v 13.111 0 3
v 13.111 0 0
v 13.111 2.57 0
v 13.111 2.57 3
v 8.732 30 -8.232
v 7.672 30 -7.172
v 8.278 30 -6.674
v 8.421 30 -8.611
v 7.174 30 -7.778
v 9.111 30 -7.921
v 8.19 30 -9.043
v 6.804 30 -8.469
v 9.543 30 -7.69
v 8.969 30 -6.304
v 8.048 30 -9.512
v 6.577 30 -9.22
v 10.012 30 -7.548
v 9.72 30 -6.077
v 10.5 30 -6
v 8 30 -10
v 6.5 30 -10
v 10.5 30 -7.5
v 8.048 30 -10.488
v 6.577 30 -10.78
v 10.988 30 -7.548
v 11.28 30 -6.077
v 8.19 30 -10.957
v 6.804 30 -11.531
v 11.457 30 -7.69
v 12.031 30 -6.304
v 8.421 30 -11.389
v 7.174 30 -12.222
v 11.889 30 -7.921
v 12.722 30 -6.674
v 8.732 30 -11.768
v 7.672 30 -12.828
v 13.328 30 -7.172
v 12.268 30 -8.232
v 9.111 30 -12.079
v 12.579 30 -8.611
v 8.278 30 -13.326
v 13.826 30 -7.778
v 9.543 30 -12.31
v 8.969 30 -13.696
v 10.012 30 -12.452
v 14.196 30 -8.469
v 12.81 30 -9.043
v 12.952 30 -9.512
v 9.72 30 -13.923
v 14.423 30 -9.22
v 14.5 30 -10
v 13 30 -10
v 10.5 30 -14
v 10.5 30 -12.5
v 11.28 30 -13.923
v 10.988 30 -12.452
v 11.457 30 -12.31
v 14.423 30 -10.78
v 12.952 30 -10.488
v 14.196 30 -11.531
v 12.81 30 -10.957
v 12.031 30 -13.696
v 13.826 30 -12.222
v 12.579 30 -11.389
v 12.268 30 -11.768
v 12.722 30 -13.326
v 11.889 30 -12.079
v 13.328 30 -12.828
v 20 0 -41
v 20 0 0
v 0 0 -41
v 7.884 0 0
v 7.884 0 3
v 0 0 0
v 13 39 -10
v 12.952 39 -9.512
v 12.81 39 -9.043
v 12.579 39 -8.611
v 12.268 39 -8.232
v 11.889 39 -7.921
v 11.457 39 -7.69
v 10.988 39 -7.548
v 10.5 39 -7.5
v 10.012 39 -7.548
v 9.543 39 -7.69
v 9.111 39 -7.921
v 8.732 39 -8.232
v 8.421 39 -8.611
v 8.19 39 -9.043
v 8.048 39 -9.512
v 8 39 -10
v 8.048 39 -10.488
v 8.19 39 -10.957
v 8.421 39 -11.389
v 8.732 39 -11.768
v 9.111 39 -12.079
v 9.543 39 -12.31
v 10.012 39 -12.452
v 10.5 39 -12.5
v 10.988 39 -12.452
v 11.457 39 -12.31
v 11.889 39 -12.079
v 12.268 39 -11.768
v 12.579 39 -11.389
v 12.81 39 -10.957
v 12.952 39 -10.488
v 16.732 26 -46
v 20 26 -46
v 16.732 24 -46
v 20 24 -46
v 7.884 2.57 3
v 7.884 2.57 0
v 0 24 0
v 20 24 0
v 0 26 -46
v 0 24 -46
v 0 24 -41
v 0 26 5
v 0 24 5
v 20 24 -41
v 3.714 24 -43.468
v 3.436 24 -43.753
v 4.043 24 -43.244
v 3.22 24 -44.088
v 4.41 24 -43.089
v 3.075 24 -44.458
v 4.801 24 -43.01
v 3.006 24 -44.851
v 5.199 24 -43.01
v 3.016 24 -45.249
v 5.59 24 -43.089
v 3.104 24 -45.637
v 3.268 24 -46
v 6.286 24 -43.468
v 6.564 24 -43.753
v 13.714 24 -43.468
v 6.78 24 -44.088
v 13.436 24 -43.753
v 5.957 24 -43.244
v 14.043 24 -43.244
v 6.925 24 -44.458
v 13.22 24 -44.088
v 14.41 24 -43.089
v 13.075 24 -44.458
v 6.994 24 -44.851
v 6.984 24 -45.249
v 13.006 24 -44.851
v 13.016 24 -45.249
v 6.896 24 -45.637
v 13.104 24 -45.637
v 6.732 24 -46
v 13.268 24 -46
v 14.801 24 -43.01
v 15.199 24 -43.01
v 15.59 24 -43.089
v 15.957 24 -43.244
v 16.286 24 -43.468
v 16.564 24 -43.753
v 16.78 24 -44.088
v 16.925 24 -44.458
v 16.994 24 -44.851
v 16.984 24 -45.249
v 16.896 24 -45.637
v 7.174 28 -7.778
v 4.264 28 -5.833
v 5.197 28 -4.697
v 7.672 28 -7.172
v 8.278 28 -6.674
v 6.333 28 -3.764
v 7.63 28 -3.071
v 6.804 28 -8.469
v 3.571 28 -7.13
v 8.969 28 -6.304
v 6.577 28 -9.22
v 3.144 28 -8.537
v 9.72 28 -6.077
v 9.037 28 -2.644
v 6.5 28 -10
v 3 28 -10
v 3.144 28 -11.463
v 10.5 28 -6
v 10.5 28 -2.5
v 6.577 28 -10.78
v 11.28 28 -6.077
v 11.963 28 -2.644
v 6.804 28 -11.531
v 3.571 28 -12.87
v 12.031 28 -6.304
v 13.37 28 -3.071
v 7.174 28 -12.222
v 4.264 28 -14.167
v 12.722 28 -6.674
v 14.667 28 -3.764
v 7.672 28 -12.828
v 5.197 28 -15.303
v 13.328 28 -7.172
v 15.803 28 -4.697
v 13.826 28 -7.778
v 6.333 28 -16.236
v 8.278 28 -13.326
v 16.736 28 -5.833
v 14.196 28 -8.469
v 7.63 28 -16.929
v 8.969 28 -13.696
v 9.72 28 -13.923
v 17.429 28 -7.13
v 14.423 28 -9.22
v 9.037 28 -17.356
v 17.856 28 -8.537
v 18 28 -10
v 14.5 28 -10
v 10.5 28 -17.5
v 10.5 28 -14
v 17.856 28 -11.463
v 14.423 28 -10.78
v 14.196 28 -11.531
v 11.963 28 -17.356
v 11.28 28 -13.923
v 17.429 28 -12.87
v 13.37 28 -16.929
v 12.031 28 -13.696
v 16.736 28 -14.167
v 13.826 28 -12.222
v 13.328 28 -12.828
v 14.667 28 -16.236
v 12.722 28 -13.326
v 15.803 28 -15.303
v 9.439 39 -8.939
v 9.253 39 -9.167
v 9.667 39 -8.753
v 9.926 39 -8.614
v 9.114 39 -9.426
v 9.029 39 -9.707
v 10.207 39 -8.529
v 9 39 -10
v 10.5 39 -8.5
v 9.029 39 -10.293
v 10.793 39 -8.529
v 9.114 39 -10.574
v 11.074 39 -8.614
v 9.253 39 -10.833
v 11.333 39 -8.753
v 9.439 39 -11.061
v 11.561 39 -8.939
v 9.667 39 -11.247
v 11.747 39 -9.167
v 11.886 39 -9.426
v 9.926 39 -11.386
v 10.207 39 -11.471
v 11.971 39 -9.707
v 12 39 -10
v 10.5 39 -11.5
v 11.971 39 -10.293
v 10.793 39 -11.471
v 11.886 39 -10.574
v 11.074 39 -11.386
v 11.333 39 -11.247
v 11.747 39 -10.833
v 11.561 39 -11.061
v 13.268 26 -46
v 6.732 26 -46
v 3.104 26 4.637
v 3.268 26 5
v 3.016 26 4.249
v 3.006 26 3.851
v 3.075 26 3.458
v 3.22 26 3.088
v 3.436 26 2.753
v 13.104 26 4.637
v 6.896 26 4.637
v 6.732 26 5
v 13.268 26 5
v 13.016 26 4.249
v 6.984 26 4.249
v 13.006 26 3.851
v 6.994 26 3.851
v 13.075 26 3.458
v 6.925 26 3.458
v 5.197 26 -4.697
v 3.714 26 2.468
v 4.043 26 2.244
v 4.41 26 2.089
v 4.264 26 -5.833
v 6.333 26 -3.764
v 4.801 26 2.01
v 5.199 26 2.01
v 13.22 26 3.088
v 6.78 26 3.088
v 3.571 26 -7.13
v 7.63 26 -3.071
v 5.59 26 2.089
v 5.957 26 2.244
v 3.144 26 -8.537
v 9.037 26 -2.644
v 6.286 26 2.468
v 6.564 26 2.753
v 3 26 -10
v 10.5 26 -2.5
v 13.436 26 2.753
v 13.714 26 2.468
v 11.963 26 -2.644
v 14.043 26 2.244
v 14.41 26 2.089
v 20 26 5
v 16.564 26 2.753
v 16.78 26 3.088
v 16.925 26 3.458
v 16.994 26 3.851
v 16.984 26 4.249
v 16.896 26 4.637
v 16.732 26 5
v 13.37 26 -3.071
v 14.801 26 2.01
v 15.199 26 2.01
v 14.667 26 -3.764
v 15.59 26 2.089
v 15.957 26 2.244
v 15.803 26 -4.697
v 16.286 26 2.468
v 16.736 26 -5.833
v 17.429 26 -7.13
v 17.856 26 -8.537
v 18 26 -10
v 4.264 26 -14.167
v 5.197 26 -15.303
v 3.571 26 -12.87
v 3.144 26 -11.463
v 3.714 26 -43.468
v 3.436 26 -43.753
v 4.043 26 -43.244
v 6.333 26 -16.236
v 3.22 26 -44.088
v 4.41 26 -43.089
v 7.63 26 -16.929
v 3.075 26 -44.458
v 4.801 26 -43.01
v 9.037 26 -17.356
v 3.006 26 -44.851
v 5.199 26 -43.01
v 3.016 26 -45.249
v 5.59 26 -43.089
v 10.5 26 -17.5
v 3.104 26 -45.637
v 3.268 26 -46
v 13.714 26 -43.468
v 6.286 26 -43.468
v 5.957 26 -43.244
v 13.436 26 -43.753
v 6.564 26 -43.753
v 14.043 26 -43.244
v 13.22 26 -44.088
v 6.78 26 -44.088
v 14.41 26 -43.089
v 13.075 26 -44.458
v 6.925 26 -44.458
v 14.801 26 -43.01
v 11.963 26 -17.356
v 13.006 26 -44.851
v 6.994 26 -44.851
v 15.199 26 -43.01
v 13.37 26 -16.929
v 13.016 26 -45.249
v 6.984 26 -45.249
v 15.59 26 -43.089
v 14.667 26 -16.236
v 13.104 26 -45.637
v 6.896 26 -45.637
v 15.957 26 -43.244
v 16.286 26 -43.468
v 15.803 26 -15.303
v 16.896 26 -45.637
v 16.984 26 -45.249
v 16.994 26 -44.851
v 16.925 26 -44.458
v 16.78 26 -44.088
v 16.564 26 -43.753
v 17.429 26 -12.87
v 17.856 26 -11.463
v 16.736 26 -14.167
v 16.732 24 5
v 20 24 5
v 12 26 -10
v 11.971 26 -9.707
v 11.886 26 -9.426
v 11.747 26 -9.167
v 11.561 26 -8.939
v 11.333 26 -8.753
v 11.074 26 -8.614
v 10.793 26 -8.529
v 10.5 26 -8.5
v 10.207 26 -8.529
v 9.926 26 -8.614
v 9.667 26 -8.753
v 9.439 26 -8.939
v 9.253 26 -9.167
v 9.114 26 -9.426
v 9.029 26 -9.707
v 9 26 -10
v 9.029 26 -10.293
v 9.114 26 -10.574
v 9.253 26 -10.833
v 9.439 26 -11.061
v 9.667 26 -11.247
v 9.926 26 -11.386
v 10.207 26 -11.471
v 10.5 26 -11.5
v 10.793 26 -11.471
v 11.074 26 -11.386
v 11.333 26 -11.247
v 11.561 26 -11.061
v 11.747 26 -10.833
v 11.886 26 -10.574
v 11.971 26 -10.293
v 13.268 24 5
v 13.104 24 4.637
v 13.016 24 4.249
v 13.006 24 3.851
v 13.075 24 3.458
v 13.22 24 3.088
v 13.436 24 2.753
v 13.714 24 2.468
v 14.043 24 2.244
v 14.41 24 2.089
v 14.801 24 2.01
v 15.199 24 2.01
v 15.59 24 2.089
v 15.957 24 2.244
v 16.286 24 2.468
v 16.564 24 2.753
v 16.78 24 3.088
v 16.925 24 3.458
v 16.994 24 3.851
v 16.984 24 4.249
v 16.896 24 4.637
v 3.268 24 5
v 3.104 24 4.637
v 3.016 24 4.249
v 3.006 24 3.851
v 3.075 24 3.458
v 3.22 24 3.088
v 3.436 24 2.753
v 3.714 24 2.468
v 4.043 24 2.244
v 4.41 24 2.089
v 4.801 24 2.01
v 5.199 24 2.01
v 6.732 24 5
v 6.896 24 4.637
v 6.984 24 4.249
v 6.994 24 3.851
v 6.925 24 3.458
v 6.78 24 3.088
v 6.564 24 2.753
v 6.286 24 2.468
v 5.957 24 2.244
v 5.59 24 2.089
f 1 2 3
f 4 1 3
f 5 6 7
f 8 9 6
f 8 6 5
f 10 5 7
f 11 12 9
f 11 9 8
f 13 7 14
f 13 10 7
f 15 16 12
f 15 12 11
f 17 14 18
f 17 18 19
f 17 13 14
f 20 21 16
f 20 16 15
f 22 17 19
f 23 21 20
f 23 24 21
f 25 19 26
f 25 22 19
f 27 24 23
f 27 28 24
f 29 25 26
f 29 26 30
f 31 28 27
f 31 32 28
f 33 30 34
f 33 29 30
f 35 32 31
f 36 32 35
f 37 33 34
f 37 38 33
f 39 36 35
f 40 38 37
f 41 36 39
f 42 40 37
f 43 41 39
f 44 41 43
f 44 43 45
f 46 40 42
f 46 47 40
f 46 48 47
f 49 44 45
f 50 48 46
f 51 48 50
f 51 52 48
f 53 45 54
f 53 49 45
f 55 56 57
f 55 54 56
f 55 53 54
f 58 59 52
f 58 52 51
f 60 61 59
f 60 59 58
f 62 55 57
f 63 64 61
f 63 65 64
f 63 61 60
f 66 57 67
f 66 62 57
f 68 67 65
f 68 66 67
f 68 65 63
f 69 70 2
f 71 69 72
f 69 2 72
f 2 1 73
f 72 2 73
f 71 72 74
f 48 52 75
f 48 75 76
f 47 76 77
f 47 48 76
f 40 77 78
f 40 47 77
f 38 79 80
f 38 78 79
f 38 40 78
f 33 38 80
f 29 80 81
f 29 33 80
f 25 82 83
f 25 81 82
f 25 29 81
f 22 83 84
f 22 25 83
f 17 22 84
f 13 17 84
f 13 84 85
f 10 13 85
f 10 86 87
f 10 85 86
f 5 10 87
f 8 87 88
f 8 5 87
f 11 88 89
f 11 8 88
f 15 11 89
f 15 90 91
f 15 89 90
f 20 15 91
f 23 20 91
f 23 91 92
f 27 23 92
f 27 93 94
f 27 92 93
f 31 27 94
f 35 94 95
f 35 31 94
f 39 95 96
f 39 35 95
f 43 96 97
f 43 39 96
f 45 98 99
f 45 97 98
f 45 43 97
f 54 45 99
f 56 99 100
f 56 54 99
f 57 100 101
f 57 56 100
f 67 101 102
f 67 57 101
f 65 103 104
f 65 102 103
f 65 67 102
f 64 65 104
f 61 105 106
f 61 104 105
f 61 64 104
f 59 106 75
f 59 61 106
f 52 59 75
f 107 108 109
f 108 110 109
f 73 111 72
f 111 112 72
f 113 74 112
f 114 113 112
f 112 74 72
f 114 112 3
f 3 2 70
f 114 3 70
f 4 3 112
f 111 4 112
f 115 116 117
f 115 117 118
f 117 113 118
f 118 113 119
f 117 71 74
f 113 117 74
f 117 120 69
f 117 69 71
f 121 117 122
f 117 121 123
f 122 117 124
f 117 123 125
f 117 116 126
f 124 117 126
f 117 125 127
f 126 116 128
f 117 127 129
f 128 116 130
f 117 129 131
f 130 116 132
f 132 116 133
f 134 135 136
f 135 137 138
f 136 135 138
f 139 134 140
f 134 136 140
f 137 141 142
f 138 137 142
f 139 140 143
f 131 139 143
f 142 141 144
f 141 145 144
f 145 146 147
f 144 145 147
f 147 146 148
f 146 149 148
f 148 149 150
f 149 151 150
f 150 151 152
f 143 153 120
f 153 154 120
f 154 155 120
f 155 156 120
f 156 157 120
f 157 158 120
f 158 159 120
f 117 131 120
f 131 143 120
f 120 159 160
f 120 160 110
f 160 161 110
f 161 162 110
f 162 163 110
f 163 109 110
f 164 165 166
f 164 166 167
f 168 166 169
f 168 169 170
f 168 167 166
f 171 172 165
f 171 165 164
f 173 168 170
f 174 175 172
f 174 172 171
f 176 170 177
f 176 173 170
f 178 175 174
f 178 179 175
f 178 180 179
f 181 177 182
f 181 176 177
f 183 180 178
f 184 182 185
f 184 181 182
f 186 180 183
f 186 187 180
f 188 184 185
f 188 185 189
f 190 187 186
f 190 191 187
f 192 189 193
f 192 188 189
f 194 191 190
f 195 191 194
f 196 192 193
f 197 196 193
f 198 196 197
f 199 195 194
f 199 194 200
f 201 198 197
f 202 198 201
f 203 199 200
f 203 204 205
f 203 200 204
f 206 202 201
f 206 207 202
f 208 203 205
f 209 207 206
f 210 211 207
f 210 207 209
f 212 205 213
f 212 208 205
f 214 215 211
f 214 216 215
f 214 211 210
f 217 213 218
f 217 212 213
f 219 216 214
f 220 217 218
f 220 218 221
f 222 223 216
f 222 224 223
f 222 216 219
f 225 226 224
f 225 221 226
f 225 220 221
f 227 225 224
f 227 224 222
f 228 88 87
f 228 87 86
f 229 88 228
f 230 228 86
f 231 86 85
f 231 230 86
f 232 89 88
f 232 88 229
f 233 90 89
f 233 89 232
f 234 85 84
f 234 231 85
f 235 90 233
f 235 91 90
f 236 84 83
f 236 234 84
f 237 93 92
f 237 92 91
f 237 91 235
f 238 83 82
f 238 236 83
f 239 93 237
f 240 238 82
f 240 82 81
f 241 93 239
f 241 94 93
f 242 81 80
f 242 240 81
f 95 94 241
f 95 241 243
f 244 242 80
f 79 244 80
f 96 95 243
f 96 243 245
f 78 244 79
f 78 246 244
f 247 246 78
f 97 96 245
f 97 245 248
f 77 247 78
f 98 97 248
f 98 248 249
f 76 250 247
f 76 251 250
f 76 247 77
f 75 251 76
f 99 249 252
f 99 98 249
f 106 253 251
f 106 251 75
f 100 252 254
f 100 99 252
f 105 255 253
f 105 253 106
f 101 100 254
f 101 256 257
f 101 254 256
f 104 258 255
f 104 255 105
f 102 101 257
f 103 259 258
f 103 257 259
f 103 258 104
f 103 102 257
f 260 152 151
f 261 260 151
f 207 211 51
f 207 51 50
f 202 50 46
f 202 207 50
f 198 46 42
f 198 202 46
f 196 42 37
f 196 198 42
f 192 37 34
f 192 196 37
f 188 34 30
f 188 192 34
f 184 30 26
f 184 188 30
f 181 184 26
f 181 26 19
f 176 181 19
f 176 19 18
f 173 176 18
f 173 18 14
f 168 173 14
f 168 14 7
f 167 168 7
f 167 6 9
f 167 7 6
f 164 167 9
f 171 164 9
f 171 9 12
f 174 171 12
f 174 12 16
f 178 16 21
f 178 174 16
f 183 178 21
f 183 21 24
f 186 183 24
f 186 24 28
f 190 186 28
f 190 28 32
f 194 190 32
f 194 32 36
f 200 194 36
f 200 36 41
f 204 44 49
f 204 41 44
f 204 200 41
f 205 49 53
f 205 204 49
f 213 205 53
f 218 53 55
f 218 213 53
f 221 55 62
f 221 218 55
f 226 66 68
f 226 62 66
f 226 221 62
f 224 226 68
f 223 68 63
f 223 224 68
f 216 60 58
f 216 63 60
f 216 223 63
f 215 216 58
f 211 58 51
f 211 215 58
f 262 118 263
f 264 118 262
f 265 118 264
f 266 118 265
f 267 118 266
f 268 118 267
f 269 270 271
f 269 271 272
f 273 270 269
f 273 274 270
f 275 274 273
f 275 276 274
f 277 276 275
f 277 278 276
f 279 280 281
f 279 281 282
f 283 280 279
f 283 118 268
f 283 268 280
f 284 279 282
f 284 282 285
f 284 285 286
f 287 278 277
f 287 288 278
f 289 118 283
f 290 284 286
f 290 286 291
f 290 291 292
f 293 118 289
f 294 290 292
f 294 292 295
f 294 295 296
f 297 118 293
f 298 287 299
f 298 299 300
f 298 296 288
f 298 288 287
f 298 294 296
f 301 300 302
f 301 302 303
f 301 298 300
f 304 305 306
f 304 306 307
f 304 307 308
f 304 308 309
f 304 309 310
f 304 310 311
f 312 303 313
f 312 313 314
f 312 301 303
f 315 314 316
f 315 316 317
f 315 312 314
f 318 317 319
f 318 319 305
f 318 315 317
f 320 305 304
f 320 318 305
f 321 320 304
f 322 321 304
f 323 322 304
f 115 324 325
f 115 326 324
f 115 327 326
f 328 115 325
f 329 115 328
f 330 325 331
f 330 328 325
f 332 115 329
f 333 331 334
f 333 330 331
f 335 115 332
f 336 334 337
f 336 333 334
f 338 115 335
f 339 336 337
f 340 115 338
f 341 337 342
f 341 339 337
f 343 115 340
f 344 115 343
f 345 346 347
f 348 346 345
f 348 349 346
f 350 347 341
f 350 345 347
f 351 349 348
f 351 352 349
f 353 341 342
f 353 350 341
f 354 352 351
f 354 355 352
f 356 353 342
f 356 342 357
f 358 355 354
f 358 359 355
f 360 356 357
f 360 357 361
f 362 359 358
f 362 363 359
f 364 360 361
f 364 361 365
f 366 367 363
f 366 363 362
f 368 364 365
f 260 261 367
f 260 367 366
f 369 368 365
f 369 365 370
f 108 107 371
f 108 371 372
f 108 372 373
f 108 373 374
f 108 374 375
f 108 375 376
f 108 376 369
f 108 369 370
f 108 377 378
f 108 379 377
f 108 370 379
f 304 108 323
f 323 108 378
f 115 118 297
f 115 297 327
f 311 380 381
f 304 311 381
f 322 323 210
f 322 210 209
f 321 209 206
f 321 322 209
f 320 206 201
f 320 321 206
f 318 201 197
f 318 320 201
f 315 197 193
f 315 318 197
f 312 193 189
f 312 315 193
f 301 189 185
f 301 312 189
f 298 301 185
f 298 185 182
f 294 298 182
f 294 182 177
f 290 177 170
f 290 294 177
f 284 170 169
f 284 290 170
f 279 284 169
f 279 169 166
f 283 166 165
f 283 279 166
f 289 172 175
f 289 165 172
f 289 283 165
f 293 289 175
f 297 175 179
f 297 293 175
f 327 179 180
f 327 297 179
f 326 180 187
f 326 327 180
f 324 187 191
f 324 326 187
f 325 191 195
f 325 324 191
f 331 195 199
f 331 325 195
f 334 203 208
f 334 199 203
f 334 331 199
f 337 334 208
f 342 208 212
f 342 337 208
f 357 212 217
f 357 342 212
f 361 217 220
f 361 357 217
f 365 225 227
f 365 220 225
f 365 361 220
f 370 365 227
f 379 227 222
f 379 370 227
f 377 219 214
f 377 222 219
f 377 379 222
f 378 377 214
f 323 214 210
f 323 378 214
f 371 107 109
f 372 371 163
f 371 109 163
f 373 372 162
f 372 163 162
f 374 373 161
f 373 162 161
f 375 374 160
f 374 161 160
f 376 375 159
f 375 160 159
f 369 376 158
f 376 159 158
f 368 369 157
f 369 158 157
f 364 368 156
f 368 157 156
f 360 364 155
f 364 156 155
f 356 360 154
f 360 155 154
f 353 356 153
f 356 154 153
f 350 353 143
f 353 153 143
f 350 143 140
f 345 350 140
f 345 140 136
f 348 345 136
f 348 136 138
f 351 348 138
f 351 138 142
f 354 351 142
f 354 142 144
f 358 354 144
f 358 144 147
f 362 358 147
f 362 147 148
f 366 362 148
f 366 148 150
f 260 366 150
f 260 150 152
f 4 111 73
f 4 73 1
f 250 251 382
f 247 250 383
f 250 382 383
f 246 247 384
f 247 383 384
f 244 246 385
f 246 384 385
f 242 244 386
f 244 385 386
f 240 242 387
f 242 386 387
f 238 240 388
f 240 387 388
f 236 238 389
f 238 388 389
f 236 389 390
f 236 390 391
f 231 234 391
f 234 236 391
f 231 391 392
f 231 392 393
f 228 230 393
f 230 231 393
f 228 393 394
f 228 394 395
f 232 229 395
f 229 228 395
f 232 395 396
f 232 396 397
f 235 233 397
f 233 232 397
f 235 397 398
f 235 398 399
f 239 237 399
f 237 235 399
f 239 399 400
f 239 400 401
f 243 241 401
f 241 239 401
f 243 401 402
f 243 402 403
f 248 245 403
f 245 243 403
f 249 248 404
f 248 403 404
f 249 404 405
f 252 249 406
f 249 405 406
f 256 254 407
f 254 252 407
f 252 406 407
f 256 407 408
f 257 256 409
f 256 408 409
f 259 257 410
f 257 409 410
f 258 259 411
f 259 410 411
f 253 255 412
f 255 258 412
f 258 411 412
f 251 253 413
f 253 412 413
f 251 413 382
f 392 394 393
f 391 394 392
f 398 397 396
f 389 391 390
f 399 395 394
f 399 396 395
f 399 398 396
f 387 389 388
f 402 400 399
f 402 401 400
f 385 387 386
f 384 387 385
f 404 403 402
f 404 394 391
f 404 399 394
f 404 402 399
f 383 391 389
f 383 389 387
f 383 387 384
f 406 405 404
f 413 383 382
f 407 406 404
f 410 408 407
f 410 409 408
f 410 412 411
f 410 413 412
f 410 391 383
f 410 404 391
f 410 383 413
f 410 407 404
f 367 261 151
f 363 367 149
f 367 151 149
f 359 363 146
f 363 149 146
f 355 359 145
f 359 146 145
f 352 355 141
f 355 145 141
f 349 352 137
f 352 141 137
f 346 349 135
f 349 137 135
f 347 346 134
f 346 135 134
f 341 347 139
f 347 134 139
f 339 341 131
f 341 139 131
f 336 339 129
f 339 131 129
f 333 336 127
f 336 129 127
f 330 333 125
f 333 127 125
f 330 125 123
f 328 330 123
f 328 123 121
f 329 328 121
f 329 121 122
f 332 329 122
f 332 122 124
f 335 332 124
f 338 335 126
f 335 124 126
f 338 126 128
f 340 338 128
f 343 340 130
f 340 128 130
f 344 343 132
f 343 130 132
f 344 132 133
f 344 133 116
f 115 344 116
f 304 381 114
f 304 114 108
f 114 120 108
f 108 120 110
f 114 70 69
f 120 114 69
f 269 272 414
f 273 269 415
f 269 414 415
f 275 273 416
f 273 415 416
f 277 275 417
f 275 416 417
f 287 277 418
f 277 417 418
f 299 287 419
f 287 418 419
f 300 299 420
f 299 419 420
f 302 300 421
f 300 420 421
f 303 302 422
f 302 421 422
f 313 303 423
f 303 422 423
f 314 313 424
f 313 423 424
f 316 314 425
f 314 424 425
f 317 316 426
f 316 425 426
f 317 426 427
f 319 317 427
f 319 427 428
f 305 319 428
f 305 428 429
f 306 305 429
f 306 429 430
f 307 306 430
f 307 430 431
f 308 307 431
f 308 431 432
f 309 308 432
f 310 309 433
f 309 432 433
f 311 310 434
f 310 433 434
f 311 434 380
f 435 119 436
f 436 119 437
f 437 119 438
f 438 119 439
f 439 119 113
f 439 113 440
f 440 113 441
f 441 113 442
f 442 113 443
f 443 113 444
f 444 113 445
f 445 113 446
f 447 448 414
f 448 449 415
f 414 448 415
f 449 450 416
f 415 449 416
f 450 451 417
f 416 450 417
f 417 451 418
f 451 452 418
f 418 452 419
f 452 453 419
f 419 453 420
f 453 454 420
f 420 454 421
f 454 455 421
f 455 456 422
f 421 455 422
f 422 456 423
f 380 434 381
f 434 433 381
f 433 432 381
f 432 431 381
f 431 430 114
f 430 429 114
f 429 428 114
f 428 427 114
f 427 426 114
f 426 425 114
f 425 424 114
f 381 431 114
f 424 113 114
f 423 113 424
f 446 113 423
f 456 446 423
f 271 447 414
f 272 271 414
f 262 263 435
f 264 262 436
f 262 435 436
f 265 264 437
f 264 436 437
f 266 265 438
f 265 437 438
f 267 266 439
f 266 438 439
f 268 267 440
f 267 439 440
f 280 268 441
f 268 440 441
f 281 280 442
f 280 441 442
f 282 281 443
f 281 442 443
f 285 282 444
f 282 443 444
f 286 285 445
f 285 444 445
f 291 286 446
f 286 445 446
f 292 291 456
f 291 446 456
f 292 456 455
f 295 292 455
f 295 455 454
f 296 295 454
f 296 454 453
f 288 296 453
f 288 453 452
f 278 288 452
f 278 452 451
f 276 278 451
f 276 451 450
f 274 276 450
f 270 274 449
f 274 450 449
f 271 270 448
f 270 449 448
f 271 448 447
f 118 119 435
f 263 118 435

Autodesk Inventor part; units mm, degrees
ref_plane "YZ Plane" through (0, 0, 0) normal (1, 0, 0) x (0, 1, 0)
ref_plane "XZ Plane" through (0, 0, 0) normal (0, 1, 0) x (-1, 0, 0)
sketch "Sketch1" plane through (0, 0, 0) normal (0, 1, 0) x (-1, 0, 0)
  line L0 (0, 0) -> (-20, 0)
  line L1 (-20, 0) -> (-20, -41)
  line L2 (-20, -41) -> (0, -41)
  line L3 (0, -41) -> (0, 0)
  dimension "d0" = 20
  dimension "d1" = 41
extrude "Extrusion1" add sketch "Sketch1" along normal blind 24
sketch "Sketch2" plane through (0, 24, 0) normal (0, 1, 0) x (1, 0, 0)
  line L0 (0, 41) -> (0, 0) projected
  line L1 (0, 0) -> (0, -5)
  line L2 (0, -5) -> (20, -5)
  line L3 (20, -5) -> (20, 46)
  line L4 (20, 46) -> (0, 46)
  line L5 (0, 46) -> (0, -5)
  line L6 (0, -4) -> (5, -4)
  circle A0 centre (5, -4) radius 2
  line L7 (5, -4) -> (15, -4)
  circle A1 centre (15, -4) radius 2
  line L8 (0, 0) -> (0, 20.5)
  line L9 (0, 20.5) -> (20, 20.5)
  line L10 (20, 0) -> (20, 41) projected
  line L11 (0, 45) -> (5, 45)
  circle A2 centre (5, 45) radius 2
  circle A3 centre (15, 45) radius 2
  line L12 (0, 0) -> (20, 0) projected
  point P0 (3.2679, -5)
  point P1 (6.7321, -5)
  point P2 (13.2679, -5)
  point P3 (16.7321, -5)
  point P4 (16.7321, 46)
  point P5 (13.2679, 46)
  point P6 (6.7321, 46)
  point P7 (3.2679, 46)
  dimension "d4" = 5
  dimension "d5" = 20
  dimension "d6" = 51
  dimension "d7" = 5
  dimension "d8" = 4
  dimension "d9" = 10
  dimension "d10" = 4
  dimension "d11" = 20.5
  dimension "d29" = 4
extrude "Extrusion2" add sketch "Sketch2" along normal blind 2 contours L5 L11 A2 L4 A3 L3 L9 L0 | L9 L3 L12 L0 | L5 L4 A2 L11 | L12 L3 L2 A1 L7 A0 L6 L1 | L6 A0 L2 L1 | L7 A1 L2 A0
sketch "Sketch3" plane through (0, 26, 0) normal (0, 1, 0) x (1, 0, 0)
  line L0 (0, 46) -> (0, -5) projected
  line L1 (0, -5) -> (0, 10)
  line L2 (0, 10) -> (10.5, 10)
  circle A0 centre (10.5, 10) radius 2.5
  circle A1 centre (10.5, 10) radius 4
  circle A2 centre (10.5, 10) radius 7.5
  circle A3 centre (10.5, 10) radius 1.5
  point P0 (0, 0)
  dimension "d14" = 15
  dimension "d15" = 10.5
  dimension "d16" = 5
  dimension "d17" = 8
  dimension "d18" = 15
  dimension "d19" = 3
extrude "Extrusion3" add sketch "Sketch3" along normal blind 13 contours A0
extrude "Extrusion4" add sketch "Sketch3" along normal blind 4 contours A1
extrude "Extrusion5" add sketch "Sketch3" along normal blind 2 contours A2
sketch "Sketch4" plane through (0, 0, 0) normal (0, 0, 1) x (1, 0, 0)
  line L0 (20, 0) -> (0, 0) projected
  line L1 (7.8843, 0) -> (13.1114, 0)
  line L2 (13.1114, 0) -> (13.1114, 2.57)
  line L3 (13.1114, 2.57) -> (7.8843, 2.57)
  line L4 (7.8843, 2.57) -> (7.8843, 0)
extrude "Extrusion6" add sketch "Sketch4" along normal blind 3
ref_plane "Work Plane1" through (0, 56, 0) normal (0, 1, 0) x (1, 0, 0)
sketch "Sketch5" plane through (0, 56, 0) normal (0, 1, 0) x (1, 0, 0)
  circle A0 centre (10.5, 10) radius 7.5 projected
  line L0 (0, 46) -> (0, -5) projected
  line L1 (0, -5) -> (3.2679, -5) projected
  arc A1 (6.7321, -5) -> (3.2679, -5) centre (5, -4) ccw projected
  line L2 (6.7321, -5) -> (13.2679, -5) projected
  arc A2 (16.7321, -5) -> (13.2679, -5) centre (15, -4) ccw projected
  line L3 (16.7321, -5) -> (20, -5) projected
  line L4 (20, -5) -> (20, 46) projected
  line L5 (20, 46) -> (16.7321, 46) projected
  arc A3 (13.2679, 46) -> (16.7321, 46) centre (15, 45) ccw projected
  line L6 (13.2679, 46) -> (6.7321, 46) projected
  arc A4 (3.2679, 46) -> (6.7321, 46) centre (5, 45) ccw projected
  line L7 (3.2679, 46) -> (0, 46) projected
  circle A5 centre (10.5, 10) radius 2.5 projected
  circle A6 centre (10.5, 10) radius 4 projected
  circle A7 centre (10.5, 10) radius 1.5 projected
  point P0 (0, 0)
properties part number "servo"
